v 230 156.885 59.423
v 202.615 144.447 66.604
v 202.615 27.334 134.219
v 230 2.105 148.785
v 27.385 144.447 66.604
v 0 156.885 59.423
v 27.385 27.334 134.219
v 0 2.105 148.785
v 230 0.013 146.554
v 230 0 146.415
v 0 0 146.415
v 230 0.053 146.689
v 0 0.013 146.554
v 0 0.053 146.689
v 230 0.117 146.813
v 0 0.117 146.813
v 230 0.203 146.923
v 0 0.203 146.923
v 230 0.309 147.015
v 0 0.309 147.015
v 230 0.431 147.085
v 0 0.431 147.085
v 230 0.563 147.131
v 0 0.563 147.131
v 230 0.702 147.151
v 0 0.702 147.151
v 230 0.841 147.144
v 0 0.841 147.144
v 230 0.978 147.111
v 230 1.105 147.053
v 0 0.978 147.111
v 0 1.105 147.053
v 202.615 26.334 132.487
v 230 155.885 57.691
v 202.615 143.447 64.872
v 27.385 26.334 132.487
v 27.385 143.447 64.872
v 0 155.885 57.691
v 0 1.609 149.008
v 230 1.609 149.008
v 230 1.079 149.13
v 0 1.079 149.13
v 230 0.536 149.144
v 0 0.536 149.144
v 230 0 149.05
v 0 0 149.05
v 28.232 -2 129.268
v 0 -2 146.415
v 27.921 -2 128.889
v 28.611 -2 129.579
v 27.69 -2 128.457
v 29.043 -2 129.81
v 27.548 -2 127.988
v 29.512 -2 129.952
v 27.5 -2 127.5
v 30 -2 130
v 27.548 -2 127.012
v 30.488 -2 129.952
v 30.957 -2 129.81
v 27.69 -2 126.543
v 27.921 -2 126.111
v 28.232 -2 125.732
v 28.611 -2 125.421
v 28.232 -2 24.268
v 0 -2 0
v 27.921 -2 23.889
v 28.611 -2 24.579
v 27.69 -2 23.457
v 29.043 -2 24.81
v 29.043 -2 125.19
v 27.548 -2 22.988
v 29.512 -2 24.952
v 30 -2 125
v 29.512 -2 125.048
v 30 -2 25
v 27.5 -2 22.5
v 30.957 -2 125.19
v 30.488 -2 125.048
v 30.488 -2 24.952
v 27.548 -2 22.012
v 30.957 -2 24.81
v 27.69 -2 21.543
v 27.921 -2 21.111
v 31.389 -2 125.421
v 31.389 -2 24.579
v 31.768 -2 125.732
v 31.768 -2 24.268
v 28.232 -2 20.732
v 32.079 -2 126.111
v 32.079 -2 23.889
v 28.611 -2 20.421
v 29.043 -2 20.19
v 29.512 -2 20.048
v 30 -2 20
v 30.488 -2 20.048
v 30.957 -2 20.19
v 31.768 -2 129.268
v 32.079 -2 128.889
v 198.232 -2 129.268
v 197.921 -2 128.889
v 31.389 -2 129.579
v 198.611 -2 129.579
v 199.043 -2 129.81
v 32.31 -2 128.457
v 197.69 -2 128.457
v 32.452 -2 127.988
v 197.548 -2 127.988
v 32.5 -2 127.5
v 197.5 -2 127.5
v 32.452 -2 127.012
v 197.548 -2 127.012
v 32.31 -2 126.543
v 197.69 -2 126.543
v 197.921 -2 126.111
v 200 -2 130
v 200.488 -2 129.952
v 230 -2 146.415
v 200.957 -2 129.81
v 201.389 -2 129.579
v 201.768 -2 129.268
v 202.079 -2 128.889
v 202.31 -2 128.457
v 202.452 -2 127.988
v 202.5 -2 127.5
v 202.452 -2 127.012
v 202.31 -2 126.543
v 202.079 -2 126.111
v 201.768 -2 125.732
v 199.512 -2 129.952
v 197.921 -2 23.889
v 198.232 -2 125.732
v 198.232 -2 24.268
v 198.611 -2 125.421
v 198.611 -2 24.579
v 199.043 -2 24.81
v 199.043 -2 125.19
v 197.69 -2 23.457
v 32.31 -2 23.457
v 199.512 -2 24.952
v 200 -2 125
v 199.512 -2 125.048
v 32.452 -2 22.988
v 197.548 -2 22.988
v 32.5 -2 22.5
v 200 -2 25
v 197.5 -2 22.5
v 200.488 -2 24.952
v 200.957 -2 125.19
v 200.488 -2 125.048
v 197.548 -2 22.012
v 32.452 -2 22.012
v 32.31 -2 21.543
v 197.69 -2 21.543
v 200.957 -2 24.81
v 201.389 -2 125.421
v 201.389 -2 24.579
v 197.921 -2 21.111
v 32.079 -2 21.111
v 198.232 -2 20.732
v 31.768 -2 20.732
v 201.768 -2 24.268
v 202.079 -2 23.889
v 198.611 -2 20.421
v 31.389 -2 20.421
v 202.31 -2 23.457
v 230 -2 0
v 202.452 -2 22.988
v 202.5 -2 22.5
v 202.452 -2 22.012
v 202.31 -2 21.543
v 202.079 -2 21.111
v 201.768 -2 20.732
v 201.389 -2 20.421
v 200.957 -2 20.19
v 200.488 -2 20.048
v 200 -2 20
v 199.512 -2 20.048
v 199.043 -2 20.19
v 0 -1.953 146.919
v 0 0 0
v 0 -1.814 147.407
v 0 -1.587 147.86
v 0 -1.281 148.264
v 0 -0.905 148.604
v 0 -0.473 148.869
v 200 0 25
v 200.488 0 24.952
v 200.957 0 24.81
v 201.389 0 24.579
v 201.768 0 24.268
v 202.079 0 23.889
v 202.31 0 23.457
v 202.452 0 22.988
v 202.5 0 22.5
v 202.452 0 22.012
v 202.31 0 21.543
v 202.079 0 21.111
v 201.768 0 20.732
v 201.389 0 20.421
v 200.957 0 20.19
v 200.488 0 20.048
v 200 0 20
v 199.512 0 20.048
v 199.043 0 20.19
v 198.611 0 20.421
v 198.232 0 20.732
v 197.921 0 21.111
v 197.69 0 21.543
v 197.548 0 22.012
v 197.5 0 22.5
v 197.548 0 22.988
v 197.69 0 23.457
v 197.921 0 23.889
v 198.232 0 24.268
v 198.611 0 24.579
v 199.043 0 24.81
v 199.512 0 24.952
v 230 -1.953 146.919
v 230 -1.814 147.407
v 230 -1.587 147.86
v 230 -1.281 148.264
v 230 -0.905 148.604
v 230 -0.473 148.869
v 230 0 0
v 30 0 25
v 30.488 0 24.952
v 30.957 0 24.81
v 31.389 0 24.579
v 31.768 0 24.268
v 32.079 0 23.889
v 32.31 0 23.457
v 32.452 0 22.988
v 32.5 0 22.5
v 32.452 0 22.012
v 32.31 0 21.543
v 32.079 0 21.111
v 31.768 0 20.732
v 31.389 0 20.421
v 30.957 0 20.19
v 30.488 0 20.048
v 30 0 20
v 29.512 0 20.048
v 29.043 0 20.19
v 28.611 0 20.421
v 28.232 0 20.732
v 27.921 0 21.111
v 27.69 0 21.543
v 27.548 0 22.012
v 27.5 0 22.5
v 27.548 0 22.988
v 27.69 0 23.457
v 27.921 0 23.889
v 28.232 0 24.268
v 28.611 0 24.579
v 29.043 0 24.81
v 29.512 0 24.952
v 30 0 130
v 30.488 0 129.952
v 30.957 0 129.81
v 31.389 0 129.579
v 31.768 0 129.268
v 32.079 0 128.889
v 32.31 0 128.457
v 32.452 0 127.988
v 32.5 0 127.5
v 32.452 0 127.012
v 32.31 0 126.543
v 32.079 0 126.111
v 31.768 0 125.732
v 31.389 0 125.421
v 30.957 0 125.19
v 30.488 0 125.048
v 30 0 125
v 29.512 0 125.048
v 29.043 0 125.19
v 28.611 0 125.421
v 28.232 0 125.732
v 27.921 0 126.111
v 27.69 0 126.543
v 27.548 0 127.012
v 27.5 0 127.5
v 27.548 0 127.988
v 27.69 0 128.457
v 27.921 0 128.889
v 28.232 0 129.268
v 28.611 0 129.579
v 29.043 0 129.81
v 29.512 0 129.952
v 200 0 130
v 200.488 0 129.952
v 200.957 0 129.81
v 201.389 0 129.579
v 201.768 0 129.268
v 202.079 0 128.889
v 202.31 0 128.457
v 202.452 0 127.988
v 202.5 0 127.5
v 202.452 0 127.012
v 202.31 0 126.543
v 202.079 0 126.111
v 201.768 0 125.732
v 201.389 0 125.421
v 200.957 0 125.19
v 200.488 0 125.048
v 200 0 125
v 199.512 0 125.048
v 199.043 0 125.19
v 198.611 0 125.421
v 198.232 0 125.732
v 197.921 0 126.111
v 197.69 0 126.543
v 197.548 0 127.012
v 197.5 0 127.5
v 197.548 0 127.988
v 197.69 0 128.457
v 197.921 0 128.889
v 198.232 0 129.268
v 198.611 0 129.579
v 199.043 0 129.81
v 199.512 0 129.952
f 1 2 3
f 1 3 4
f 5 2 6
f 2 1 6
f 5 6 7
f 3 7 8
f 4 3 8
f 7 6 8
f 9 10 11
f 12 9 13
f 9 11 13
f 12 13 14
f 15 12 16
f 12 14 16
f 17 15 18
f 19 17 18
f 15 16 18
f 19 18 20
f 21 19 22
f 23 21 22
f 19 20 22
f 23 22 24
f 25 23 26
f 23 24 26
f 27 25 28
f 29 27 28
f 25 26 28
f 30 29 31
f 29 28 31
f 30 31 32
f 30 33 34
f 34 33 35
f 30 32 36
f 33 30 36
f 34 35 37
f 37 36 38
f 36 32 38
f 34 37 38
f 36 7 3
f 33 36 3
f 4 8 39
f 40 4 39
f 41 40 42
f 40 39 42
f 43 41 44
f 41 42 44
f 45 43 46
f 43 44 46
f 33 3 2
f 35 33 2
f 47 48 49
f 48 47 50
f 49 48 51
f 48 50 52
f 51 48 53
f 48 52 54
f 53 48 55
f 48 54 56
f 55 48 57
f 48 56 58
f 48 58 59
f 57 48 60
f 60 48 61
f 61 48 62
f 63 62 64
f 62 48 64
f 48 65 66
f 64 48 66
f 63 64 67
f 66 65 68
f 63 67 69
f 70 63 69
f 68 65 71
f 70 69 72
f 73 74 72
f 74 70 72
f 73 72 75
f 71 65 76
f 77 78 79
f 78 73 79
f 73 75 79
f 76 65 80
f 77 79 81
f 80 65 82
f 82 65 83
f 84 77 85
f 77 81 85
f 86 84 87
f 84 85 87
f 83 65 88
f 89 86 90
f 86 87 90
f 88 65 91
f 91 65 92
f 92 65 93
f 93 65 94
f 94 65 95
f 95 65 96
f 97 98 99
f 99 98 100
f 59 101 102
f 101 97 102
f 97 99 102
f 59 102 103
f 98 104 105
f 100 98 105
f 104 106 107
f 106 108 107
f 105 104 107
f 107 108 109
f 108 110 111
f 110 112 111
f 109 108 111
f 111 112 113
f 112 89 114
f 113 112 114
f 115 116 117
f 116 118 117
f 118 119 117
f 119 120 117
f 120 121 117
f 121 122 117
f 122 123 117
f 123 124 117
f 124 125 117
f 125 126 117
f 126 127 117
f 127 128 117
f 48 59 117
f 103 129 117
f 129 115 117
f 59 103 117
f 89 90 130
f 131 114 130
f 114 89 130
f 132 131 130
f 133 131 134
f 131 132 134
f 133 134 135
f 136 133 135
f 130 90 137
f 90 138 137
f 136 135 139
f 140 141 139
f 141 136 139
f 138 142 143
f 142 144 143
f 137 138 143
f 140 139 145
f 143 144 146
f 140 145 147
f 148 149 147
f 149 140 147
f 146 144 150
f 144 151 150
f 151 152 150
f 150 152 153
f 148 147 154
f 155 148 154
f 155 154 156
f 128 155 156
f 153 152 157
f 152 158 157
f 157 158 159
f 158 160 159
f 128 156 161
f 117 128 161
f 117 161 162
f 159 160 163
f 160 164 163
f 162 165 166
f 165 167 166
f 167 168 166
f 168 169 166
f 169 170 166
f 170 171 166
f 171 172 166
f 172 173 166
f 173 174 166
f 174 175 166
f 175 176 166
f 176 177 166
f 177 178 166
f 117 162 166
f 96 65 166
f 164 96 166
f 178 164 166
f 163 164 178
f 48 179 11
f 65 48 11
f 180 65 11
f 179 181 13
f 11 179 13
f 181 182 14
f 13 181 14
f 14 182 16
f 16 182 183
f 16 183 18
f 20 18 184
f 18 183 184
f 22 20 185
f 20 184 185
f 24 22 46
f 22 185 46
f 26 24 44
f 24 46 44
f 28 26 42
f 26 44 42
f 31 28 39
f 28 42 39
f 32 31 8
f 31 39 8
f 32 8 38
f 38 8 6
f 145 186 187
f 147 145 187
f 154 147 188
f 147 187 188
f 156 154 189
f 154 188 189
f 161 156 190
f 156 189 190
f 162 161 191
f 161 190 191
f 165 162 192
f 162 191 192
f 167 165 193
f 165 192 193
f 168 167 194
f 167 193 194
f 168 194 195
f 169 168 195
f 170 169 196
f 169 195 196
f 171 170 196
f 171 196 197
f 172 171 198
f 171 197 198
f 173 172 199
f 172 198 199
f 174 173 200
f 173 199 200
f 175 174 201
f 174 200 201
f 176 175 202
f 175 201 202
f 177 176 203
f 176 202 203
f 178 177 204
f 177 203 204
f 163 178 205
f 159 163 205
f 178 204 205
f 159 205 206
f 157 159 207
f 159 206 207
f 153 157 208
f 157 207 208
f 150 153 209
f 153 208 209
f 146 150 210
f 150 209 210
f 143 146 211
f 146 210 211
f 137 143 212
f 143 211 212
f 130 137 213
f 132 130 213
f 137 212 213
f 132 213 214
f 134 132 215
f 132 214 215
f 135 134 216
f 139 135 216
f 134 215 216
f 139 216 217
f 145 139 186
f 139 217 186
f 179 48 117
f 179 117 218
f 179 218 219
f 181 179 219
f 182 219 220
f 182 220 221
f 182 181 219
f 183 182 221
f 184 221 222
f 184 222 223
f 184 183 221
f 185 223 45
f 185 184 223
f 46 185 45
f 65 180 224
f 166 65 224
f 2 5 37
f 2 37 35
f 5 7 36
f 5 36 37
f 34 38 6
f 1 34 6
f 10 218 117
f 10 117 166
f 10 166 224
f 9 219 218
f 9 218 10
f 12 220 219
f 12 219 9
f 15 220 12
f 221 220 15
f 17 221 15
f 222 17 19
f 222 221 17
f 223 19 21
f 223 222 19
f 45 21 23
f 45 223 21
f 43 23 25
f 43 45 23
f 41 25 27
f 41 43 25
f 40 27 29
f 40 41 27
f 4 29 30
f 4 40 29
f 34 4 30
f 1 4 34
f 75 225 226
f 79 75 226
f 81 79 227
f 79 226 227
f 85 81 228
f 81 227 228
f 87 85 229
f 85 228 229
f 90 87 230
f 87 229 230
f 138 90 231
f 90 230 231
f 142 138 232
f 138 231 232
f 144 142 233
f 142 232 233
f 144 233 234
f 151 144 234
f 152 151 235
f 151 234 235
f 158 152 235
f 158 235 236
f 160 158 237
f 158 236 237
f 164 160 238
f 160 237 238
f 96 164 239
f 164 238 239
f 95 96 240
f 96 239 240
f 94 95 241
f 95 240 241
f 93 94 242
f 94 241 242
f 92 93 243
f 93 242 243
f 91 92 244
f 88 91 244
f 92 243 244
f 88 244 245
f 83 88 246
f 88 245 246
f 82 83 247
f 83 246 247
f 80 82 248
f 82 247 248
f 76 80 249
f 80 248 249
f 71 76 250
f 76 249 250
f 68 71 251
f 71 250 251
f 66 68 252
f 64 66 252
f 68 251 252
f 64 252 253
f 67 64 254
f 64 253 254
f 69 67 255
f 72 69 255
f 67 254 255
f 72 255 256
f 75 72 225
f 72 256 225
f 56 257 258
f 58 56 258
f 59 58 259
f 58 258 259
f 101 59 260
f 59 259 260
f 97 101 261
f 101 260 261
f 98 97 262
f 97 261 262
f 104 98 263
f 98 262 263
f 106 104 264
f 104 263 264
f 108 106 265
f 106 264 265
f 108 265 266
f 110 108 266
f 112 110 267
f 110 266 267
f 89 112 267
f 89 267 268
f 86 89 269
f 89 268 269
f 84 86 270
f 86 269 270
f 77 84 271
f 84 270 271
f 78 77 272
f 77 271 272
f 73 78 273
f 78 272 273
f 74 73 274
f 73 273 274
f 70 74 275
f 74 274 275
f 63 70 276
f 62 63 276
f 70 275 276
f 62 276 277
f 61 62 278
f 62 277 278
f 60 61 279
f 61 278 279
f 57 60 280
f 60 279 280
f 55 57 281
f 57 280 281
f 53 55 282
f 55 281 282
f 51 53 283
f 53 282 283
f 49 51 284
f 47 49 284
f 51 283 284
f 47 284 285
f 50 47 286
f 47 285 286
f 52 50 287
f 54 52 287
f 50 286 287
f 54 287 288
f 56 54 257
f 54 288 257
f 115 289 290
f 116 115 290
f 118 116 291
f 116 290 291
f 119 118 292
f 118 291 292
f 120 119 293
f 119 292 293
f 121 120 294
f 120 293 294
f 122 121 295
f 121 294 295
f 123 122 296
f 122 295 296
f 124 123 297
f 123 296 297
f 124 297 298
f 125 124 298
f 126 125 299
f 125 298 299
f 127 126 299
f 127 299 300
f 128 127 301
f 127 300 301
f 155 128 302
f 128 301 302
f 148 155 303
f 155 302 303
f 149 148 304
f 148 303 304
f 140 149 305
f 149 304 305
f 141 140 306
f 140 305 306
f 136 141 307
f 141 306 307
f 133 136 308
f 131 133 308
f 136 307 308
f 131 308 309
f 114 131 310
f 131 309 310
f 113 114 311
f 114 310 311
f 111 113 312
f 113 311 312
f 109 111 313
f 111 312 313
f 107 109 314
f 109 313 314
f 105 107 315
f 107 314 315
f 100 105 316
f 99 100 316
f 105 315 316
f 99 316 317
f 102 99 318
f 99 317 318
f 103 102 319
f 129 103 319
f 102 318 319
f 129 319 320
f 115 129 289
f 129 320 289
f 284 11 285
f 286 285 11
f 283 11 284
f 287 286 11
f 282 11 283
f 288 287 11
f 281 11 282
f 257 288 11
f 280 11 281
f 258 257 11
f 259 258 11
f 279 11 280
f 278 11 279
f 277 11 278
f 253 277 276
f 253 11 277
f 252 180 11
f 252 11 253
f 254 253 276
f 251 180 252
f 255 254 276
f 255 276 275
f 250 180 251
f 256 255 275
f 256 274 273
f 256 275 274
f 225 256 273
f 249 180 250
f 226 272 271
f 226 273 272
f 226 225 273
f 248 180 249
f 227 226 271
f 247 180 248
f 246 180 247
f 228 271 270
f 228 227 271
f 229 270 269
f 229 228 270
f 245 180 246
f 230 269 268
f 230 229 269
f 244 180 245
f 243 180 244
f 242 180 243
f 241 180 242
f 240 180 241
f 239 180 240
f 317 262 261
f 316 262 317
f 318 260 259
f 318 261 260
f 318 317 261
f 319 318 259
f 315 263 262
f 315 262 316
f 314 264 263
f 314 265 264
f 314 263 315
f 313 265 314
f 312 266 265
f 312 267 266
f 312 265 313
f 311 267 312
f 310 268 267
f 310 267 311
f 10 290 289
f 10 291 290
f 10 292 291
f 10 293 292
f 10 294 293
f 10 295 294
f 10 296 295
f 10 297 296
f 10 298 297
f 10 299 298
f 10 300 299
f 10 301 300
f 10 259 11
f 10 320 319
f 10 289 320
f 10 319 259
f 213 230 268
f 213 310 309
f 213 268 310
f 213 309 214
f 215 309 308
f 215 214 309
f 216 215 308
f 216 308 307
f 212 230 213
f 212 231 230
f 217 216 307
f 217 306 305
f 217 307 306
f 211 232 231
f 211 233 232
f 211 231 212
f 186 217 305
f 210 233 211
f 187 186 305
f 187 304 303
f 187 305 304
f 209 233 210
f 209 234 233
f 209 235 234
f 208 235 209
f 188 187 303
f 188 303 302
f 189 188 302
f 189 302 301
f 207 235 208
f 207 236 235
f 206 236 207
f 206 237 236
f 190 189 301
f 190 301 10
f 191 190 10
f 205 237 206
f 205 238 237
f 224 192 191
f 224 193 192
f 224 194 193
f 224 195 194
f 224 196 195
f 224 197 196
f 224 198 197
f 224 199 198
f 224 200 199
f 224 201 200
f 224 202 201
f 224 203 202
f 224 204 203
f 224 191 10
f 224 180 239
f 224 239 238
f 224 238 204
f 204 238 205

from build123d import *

# Parameters (mm, degrees)
ESBO_O1_W              = 230
ESBO_O1_H              = 150
ESBO_O1_R              = 2.5
FLANGE_BASE1_DEPTH     = 2
ARESTA_FLANGE1_DEPTH   = 230
ARESTA_FLANGE1_2_DEPTH = 230
CORTE_EXTRUS_O1_REACH  = 274.044
ESBO_O11_W             = 175.23
ESBO_O11_H             = 135.23


# Read off the part's stored shape, not the designer's step: Aresta-Flange1
# Sheet-metal steps are written as plain solids
with BuildPart() as part:
    # Esboço1 → Flange-base1 (new body)
    with BuildSketch(Plane(origin=(0, 0, 0), x_dir=(1, 0, 0), z_dir=(0, 1, 0))):
        with Locations((115, -75)):
            Rectangle(ESBO_O1_W, ESBO_O1_H)
        with Locations(Location((30, -22.5, 0), (0, 0, 270))):
            Circle(ESBO_O1_R, mode=Mode.SUBTRACT)
        with Locations(Location((30, -127.5, 0), (0, 0, 270))):
            Circle(ESBO_O1_R, mode=Mode.SUBTRACT)
        with Locations(Location((200, -127.5, 0), (0, 0, 270))):
            Circle(ESBO_O1_R, mode=Mode.SUBTRACT)
        with Locations(Location((200, -22.5, 0), (0, 0, 270))):
            Circle(ESBO_O1_R, mode=Mode.SUBTRACT)
    extrude(amount=-FLANGE_BASE1_DEPTH)

    # Aresta-Flange1 outline → Aresta-Flange1 (cut)
    with BuildSketch(Plane.YZ):
        with BuildLine():
            ThreePointArc((-2, 146.414770298), (-1.443395312, 148.069037507), (0, 149.050372696))
            Line((0, 149.050372696), (0, 150))
            Line((0, 150), (-2, 150))
            Line((-2, 150), (-2, 146.414770298))
        make_face()
    extrude(amount=ARESTA_FLANGE1_DEPTH, mode=Mode.SUBTRACT)

    # Aresta-Flange1 2 outline → Aresta-Flange1 2 (add)
    with BuildSketch(Plane.YZ):
        with BuildLine():
            Line((156.884572681, 59.422649731), (2.1049, 148.784735418))
            ThreePointArc((2.1049, 148.784735418), (1.079239772, 149.129835223), (0, 149.050372696))
            Line((0, 149.050372696), (0, 146.414770298))
            ThreePointArc((0, 146.414770298), (0.3683, 147.052684611), (1.1049, 147.052684611))
            Line((1.1049, 147.052684611), (155.884572681, 57.690598923))
            Line((155.884572681, 57.690598923), (156.884572681, 59.422649731))
        make_face()
    extrude(amount=ARESTA_FLANGE1_2_DEPTH)

    # Esboço11 → Corte-extrusão1 (cut, up to next)
    with BuildSketch(Plane(origin=(0, 64.951905284, 112.5), x_dir=(1, 0, 0), z_dir=(0, 0.499999999999998, 0.8660254037844398)), mode=Mode.PRIVATE) as corte_extrus_o1_sk1:
        with Locations((115, 24.177614851)):
            Rectangle(ESBO_O11_W, ESBO_O11_H)
    corte_extrus_o1_tool1 = extrude(corte_extrus_o1_sk1.sketch, amount=-CORTE_EXTRUS_O1_REACH, mode=Mode.PRIVATE) & part.part
    add(corte_extrus_o1_tool1.solids().sort_by_distance((115, 85.890334, 100.411193))[0], mode=Mode.SUBTRACT)


solid = part.part
